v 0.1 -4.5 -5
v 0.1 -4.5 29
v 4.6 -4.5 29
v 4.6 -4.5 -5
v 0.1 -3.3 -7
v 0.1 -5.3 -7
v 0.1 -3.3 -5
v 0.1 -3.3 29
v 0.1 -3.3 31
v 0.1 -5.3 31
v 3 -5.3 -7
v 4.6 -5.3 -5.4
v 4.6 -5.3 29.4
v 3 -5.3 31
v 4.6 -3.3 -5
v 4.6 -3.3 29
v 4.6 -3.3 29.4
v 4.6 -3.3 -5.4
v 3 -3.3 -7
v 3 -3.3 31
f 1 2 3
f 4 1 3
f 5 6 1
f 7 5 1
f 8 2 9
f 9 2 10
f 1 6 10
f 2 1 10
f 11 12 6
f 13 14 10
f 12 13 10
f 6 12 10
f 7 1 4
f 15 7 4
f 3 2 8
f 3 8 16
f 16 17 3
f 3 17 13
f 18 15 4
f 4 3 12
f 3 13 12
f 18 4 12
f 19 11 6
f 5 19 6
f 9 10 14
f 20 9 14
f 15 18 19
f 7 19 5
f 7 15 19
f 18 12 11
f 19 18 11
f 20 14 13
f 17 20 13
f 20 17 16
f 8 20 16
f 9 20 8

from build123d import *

# Parameters (mm, degrees)
SKETCH040_W      = 7
SKETCH040_H      = 34
EXTRUDE049_DEPTH = 2
EXTRUDE048_DEPTH = 2


with BuildPart() as extrude049:
    # Sketch040 → Extrude049 (new body)
    with BuildSketch(Plane.XZ.offset(4.5)):
        with Locations((-37.5, 12)):
            Rectangle(SKETCH040_W, SKETCH040_H)
    extrude(amount=-EXTRUDE049_DEPTH)


with BuildPart() as bulge_overlap:
    # Sketch039 → Extrude048 (new body)
    with BuildSketch(Plane.XZ.offset(5.3)):
        Polygon((-37, 31), (-35.4, 29.4), (-35.4, -5.4), (-37, -7), (-39.9, -7), (-39.9, 31), align=None)
    extrude(amount=-EXTRUDE048_DEPTH)

    # Cut027: cut Extrude049
    add(extrude049.part, mode=Mode.SUBTRACT)


with BuildPart() as bulge_overlap_1:
    # Cut027 placement: moved
    add(bulge_overlap.part.moved(Location((40, 0, 0))))


solid = bulge_overlap_1.part
